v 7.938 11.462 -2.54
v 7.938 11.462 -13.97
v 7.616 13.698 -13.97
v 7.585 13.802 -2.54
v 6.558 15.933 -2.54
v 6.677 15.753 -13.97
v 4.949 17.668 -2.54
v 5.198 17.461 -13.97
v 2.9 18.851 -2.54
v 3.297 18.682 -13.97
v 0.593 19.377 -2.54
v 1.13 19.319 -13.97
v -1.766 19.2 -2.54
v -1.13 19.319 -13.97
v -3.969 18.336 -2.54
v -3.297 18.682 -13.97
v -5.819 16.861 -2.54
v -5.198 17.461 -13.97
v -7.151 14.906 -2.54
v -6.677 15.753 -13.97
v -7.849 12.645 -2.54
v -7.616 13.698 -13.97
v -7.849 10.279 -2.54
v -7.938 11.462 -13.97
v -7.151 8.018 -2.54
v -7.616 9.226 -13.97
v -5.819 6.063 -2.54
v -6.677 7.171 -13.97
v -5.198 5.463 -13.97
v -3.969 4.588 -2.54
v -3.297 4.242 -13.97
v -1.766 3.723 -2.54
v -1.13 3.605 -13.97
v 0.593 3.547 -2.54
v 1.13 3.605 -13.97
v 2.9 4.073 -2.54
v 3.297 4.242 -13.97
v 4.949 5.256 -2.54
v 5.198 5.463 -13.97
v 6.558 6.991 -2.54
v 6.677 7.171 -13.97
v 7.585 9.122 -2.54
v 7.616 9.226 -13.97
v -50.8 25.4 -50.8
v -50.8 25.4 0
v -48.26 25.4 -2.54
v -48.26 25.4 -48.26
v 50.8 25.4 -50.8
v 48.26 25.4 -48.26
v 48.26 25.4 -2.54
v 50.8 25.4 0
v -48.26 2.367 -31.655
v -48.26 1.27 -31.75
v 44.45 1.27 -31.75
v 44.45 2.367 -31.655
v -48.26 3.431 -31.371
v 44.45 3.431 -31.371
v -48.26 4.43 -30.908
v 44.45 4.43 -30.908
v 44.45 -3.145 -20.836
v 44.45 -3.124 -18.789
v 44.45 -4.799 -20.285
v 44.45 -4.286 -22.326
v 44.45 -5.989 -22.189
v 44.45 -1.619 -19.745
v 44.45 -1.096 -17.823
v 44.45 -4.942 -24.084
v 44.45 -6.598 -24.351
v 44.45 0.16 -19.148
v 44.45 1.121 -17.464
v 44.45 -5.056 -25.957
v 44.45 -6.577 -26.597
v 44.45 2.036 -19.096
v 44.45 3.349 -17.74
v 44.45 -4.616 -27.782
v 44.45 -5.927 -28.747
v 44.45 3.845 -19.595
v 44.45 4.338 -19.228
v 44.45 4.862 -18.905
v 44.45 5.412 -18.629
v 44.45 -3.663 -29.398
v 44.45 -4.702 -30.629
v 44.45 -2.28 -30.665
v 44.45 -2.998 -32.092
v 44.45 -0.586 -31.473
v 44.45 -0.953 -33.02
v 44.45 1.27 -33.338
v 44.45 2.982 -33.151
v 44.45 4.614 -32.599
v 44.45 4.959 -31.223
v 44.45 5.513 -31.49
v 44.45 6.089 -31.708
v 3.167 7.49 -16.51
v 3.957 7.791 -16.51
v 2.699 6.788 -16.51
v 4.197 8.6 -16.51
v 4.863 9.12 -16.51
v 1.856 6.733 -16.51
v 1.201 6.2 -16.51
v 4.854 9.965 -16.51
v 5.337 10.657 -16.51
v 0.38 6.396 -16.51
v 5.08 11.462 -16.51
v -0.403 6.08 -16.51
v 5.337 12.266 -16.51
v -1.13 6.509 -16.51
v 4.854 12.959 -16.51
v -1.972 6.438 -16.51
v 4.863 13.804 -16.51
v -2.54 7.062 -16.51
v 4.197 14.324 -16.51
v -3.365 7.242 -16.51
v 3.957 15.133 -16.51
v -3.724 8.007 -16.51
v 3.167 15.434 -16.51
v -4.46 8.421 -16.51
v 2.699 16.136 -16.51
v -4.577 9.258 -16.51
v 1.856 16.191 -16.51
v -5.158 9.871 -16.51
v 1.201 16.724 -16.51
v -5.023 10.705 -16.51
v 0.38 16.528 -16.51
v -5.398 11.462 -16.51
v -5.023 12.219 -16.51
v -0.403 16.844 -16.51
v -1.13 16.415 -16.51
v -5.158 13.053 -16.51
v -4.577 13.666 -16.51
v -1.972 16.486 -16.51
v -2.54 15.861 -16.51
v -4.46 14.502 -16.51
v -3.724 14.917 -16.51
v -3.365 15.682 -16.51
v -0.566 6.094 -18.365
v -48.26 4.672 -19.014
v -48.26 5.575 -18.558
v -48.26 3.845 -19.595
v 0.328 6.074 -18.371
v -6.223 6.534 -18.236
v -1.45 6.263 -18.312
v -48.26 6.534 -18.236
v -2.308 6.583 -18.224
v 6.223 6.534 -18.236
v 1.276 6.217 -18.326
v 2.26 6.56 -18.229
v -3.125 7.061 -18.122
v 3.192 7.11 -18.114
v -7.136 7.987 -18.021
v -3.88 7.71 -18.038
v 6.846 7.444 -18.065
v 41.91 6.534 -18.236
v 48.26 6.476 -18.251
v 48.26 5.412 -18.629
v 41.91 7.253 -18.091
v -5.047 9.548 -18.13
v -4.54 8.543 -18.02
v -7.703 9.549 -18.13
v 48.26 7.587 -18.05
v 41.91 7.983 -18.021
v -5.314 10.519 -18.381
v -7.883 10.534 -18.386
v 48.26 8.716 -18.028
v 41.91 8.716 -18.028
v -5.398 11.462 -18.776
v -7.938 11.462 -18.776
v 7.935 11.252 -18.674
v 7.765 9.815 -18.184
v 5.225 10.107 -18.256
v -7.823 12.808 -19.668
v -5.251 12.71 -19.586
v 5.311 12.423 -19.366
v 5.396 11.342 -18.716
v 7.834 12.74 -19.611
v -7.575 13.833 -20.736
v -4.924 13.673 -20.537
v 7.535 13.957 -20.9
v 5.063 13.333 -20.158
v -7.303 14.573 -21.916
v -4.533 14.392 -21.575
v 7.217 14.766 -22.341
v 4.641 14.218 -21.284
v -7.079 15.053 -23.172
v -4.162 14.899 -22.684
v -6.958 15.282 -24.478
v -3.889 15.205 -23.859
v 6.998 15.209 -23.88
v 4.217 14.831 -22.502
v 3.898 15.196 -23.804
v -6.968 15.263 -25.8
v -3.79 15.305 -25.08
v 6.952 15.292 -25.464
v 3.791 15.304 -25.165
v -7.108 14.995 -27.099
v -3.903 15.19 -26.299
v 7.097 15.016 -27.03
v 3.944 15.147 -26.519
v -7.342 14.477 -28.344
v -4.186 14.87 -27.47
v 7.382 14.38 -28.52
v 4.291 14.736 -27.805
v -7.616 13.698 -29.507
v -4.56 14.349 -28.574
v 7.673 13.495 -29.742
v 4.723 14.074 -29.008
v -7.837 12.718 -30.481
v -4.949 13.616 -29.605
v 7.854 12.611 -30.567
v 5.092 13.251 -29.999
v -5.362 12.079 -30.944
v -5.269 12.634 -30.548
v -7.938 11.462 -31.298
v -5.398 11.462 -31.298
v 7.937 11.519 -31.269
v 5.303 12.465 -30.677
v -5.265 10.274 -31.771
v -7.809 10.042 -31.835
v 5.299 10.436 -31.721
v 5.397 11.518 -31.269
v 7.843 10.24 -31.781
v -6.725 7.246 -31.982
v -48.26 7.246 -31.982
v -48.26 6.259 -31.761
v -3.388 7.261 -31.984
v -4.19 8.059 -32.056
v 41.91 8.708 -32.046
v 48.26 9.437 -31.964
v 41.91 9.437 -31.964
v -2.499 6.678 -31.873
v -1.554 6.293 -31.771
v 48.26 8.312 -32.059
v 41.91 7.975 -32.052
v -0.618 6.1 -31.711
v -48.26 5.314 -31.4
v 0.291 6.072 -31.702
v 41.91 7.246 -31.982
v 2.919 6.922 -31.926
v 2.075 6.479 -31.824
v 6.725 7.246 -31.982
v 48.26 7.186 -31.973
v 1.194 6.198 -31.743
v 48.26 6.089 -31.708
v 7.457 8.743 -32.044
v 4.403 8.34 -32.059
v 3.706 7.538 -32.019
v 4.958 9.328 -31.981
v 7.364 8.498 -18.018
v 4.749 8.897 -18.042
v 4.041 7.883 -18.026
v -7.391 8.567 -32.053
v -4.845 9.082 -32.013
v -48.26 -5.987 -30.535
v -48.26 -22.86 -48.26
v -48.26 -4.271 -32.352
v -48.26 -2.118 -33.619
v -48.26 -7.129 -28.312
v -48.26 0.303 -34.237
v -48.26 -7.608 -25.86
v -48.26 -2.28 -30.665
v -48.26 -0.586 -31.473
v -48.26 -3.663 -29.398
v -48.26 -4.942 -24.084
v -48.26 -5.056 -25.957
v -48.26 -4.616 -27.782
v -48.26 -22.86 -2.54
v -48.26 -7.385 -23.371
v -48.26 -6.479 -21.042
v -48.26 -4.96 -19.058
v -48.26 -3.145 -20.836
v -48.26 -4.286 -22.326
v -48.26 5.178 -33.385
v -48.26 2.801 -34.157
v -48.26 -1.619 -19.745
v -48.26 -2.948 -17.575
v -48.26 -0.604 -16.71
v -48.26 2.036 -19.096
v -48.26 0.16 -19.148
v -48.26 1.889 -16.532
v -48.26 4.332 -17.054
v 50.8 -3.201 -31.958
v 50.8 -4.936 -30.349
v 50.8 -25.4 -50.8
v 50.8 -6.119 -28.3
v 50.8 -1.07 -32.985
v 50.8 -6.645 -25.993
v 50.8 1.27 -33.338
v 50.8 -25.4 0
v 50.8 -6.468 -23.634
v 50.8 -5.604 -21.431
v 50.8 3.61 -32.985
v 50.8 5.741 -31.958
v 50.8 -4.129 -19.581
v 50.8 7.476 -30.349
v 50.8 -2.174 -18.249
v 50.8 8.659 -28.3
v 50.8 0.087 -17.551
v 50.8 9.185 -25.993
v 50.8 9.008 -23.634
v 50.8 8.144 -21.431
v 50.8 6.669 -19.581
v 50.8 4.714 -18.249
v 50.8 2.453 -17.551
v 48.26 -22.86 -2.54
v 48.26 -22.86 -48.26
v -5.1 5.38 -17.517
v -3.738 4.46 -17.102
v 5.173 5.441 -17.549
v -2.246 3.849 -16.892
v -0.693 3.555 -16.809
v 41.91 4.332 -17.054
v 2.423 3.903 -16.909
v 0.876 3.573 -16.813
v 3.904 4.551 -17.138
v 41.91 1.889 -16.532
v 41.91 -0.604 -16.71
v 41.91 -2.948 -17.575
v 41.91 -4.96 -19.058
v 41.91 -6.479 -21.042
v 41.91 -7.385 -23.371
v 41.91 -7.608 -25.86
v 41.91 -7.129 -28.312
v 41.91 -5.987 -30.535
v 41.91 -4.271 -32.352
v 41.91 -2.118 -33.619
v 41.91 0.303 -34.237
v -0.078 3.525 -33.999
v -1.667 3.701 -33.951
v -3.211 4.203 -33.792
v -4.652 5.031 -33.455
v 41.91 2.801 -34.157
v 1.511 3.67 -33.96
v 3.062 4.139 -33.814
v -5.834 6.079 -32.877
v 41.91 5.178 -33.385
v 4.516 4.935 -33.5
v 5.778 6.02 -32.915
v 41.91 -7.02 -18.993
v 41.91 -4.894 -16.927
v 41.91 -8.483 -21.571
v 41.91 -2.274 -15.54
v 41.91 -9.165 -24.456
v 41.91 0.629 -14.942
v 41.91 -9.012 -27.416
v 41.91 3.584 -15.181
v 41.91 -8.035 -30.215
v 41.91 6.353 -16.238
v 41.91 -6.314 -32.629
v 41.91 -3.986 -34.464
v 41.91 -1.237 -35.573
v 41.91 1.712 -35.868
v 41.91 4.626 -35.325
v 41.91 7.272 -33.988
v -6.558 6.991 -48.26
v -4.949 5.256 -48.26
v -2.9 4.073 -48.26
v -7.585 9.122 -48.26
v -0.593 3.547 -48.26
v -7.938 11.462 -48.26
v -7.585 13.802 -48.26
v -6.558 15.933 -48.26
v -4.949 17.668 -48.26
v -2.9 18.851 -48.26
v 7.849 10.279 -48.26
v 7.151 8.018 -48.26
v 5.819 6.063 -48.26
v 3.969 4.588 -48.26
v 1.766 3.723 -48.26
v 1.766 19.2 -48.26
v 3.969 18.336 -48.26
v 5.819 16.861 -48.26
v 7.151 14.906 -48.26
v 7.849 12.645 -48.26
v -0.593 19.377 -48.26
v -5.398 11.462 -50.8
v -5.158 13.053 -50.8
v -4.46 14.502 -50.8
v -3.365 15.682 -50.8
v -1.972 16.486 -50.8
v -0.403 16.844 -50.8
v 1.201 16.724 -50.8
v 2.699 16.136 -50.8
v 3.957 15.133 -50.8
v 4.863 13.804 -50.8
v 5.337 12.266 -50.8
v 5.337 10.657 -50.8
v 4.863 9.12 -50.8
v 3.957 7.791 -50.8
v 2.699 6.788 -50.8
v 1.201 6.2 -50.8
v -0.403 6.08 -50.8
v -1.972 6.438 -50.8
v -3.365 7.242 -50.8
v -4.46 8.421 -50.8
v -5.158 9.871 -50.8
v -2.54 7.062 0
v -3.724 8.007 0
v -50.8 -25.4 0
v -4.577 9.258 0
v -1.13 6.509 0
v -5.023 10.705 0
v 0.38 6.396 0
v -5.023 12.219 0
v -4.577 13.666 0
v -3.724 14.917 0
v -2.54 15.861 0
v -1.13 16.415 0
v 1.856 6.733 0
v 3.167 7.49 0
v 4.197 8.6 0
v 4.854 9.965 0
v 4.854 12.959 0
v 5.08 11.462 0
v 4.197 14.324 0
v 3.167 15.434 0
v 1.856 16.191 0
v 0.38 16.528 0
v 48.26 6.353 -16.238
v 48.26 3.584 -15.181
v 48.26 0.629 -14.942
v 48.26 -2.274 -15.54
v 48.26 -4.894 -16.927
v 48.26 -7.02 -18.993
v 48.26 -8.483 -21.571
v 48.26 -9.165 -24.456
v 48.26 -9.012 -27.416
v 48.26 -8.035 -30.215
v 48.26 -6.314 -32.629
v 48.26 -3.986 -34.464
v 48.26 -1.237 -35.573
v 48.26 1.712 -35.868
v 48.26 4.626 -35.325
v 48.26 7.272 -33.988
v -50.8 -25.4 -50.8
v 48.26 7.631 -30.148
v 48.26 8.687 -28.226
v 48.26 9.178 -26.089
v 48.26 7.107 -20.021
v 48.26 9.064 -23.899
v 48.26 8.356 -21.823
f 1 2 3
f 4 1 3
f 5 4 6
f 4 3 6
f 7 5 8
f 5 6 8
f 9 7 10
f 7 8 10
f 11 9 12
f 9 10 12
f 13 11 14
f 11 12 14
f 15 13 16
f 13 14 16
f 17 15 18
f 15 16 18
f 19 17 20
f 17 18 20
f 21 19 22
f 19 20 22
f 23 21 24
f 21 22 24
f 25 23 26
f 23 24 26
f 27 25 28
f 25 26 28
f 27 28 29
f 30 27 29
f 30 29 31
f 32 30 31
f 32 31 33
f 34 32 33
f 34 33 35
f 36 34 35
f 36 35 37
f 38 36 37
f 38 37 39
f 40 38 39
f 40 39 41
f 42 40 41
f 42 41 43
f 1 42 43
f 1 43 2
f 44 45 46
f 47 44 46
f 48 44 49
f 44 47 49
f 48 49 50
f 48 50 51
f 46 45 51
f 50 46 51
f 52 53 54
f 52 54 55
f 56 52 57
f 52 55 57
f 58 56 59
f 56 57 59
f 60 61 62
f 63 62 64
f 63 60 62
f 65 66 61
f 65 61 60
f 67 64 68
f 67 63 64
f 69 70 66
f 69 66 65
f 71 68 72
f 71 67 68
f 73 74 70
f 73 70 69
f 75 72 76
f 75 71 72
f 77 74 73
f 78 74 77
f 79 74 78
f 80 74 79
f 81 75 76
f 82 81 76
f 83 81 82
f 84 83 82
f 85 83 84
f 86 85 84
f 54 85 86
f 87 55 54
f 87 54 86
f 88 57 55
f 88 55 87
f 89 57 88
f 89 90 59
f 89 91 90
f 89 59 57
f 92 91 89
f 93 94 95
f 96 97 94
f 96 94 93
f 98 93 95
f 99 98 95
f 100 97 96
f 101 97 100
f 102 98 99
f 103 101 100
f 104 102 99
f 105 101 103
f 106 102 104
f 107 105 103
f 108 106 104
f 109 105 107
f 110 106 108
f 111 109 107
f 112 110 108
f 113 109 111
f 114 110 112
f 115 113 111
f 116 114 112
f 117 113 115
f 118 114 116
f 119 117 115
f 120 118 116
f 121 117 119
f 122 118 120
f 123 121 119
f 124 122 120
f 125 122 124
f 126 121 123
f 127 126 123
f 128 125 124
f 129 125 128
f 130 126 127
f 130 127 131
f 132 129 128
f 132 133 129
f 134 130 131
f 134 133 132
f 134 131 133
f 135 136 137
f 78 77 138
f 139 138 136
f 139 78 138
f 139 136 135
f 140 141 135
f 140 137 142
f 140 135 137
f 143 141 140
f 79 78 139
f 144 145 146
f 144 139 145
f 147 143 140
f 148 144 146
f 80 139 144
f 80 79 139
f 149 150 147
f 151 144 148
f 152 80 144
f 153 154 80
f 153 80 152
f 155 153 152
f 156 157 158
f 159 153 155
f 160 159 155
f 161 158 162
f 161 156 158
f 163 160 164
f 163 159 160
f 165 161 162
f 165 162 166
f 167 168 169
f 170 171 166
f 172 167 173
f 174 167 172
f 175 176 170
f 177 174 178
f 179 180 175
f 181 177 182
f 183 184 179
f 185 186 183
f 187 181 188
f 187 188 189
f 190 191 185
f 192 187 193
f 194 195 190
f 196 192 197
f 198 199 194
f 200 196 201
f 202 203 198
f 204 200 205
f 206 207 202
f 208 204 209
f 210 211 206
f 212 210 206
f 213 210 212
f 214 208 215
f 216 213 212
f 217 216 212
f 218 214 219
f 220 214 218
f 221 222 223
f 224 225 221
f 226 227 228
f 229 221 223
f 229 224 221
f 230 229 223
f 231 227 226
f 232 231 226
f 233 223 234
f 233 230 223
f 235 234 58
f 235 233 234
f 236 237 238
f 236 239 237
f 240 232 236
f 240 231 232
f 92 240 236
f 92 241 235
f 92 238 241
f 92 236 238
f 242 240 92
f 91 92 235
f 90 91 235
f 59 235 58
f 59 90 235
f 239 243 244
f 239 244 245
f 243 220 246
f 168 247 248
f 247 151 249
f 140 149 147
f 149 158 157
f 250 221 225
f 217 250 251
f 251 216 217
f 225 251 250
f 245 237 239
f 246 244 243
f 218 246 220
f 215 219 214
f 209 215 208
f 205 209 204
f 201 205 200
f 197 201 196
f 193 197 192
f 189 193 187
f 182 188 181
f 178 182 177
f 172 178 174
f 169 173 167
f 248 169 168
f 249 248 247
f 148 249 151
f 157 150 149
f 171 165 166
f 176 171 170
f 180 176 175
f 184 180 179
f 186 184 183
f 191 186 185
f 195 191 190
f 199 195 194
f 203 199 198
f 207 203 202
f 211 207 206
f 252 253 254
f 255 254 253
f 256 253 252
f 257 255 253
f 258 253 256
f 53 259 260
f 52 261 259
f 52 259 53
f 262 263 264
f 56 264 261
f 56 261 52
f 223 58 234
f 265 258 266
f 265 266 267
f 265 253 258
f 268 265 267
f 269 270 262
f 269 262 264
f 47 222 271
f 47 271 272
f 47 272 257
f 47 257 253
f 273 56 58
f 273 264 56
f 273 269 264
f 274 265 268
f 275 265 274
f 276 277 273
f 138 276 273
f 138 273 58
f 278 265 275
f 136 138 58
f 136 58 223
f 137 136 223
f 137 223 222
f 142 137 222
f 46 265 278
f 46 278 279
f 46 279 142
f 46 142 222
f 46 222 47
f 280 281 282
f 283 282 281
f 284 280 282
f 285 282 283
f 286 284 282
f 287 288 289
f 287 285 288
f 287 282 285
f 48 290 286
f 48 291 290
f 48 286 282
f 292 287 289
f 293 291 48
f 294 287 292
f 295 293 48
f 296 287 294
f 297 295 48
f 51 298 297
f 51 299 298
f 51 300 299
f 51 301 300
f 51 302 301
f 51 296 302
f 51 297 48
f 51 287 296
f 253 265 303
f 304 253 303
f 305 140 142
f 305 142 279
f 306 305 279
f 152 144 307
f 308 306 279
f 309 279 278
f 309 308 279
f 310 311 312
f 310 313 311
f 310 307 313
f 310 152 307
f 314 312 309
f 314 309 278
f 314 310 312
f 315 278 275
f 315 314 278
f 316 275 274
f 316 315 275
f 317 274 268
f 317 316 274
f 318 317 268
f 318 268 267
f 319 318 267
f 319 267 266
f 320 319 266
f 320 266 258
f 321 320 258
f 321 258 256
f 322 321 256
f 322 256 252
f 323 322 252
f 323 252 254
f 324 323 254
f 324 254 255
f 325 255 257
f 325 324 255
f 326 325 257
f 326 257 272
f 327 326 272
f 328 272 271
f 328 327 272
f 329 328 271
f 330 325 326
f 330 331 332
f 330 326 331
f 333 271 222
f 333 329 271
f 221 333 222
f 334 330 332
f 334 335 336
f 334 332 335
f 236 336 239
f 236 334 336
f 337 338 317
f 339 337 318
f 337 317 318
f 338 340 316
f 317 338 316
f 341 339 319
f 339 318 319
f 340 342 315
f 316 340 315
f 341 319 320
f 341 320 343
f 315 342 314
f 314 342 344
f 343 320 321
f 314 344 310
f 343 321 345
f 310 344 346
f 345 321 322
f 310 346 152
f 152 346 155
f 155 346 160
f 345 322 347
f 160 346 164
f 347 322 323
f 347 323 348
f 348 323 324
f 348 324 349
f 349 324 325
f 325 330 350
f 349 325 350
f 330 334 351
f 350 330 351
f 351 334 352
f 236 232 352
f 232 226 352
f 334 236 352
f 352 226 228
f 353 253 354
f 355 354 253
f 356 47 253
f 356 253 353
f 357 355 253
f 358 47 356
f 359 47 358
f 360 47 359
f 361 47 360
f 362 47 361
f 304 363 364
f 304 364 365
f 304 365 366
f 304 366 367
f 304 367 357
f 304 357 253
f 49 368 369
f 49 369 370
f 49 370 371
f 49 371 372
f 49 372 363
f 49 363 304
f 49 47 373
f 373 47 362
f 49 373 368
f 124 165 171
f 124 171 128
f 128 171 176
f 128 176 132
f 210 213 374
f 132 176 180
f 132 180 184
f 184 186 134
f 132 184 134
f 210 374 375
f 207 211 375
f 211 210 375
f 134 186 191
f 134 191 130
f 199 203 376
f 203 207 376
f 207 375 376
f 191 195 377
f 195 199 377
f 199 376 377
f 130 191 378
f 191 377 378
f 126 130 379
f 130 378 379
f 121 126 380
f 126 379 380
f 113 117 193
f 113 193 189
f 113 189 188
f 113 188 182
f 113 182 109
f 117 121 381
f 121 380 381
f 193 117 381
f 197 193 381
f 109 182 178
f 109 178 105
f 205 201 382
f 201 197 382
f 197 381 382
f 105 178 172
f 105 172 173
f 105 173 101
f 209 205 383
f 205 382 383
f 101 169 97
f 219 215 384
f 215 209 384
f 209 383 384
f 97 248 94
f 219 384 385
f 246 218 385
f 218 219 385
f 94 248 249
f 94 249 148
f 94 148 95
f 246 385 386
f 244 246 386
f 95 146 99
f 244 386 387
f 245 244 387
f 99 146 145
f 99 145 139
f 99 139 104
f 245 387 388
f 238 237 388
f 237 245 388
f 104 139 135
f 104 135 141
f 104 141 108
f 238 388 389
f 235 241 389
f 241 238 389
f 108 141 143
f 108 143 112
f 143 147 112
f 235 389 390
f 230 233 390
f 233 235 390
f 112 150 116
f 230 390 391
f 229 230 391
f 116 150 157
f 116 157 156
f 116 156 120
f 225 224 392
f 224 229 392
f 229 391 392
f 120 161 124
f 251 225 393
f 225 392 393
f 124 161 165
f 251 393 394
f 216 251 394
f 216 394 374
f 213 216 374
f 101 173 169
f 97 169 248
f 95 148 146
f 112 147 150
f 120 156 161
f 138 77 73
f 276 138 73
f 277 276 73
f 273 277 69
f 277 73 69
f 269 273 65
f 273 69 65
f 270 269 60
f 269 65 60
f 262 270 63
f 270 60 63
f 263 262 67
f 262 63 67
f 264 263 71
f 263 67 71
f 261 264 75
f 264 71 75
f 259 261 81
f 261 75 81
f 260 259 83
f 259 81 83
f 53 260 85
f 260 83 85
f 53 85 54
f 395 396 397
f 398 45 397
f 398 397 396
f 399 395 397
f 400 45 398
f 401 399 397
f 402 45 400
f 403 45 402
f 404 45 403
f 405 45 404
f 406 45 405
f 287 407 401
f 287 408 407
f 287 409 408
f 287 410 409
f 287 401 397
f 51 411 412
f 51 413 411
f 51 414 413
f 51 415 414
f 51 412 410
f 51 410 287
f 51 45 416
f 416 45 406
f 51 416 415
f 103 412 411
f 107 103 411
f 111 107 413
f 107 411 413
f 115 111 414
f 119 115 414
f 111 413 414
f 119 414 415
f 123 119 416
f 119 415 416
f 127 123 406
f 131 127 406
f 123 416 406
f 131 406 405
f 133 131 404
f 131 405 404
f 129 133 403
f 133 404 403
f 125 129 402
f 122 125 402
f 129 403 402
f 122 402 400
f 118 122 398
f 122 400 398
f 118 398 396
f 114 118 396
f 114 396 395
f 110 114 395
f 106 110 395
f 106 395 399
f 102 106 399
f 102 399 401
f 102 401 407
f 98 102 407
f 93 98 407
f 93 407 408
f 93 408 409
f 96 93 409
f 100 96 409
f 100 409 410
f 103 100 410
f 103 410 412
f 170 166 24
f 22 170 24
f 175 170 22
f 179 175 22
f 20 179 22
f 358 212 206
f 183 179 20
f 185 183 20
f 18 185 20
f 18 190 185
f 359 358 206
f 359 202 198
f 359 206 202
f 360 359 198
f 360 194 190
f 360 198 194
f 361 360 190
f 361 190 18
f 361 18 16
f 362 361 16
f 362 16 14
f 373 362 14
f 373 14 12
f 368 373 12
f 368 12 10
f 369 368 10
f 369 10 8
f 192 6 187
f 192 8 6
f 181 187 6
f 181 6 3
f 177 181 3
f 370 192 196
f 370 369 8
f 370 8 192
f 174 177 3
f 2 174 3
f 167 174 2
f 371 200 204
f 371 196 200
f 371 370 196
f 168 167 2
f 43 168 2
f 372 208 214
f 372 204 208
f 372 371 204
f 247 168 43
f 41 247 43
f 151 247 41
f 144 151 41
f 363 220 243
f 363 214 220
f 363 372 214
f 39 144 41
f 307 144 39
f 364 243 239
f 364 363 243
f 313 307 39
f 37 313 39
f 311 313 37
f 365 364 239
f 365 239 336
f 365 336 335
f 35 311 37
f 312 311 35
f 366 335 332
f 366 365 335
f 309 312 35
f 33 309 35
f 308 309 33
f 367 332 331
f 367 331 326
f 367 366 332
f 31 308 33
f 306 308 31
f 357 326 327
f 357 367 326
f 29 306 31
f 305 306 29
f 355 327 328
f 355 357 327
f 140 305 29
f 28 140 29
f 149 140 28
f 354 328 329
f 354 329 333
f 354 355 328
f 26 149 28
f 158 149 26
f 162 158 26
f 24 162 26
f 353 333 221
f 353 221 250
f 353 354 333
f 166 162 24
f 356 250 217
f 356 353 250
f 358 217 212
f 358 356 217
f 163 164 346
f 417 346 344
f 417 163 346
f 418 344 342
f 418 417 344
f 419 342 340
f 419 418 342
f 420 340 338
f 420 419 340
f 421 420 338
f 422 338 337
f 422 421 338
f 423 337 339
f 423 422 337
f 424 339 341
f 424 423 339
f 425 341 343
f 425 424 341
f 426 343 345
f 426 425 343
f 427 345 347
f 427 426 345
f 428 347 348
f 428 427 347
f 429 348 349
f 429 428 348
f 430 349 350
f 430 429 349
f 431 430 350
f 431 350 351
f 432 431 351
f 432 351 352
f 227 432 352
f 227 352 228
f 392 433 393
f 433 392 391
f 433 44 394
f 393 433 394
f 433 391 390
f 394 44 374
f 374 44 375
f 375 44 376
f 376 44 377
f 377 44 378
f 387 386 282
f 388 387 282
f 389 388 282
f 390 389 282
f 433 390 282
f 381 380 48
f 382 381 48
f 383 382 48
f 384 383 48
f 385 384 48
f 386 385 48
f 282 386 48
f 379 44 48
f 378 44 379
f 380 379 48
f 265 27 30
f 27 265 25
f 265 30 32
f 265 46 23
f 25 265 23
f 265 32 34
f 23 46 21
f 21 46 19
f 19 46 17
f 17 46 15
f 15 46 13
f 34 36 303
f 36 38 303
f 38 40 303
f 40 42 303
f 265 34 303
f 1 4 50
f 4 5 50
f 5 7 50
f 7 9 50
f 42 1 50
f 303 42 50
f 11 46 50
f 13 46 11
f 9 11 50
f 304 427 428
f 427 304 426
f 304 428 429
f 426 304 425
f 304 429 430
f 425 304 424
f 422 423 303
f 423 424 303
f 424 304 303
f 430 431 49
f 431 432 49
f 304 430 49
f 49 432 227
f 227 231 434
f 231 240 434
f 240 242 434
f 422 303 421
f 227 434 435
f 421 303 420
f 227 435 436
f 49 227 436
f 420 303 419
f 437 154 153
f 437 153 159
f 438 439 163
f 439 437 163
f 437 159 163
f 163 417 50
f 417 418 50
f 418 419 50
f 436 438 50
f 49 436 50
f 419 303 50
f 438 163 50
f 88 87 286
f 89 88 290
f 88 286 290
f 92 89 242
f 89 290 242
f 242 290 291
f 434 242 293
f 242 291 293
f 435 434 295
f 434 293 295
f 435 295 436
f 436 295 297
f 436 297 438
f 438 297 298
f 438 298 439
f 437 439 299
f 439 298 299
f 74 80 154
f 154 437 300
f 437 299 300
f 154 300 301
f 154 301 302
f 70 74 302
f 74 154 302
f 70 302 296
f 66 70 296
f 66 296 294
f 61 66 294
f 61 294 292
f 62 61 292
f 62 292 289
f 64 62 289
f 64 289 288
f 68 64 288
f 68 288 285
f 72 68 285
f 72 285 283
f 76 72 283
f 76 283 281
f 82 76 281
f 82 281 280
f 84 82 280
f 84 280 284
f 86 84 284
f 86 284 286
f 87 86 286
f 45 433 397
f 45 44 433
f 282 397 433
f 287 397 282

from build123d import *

# Parameters (mm, degrees)
SKETCH1_W           = 101.6
SKETCH1_H           = 50.8
BOSS_EXTRUDE1_DEPTH = 50.8
SKETCH2_R           = 7.9375
CUT_EXTRUDE1_DEPTH  = 6.35
SKETCH3_R           = 6.35
CUT_EXTRUDE2_DEPTH  = 102.6
SKETCH4_R           = 5.3975
CUT_EXTRUDE3_DEPTH  = 34.29
SHELL9_T            = -2.54
SKETCH5_R           = 7.022033088
CUT_EXTRUDE4_DEPTH  = 96.52
SKETCH7_R           = 7.9375
BOSS_EXTRUDE3_DEPTH = 11.43
SKETCH9_R           = 5.08
CUT_EXTRUDE5_DEPTH  = 34.29
SKETCH10_R          = 6.35
BOSS_EXTRUDE4_DEPTH = 2.54


with BuildPart() as part:
    # Sketch1 → Boss-Extrude1 (new body)
    with BuildSketch(Plane.XY):
        Rectangle(SKETCH1_W, SKETCH1_H)
    extrude(amount=-BOSS_EXTRUDE1_DEPTH)

    # Sketch2 → Cut-Extrude1 (cut)
    with BuildSketch(Plane(origin=(50.8, 0, 0), x_dir=(0, 0, -1), z_dir=(1, 0, 0))):
        with Locations((25.4, 1.27)):
            Circle(SKETCH2_R)
    extrude(amount=-CUT_EXTRUDE1_DEPTH, mode=Mode.SUBTRACT)

    # Sketch3 → Cut-Extrude2 (cut, through all)
    with BuildSketch(Plane(origin=(50.8, 0, 0), x_dir=(0, 0, -1), z_dir=(1, 0, 0))):
        with Locations((25.4, 1.27)):
            Circle(SKETCH3_R)
    extrude(amount=-CUT_EXTRUDE2_DEPTH, mode=Mode.SUBTRACT)

    # Sketch4 → Cut-Extrude3 (cut)
    with BuildSketch(Plane(origin=(0, 0, -50.8), x_dir=(-1, 0, 0), z_dir=(0, 0, -1))):
        with Locations((0, 11.461907579)):
            Circle(SKETCH4_R)
    extrude(amount=-CUT_EXTRUDE3_DEPTH, mode=Mode.SUBTRACT)

    # Shell9
    shell9_openings = [part.faces().sort_by_distance(p)[0] for p in [
        (0, 25.4, -25.4),
    ]]
    offset(amount=SHELL9_T, openings=shell9_openings, kind=Kind.INTERSECTION)

    # Sketch5 → Cut-Extrude4 (cut)
    with BuildSketch(Plane.ZY.offset(-48.26)):
        with Locations((-25.037035013, 8.282646085)):
            Circle(SKETCH5_R)
    extrude(amount=CUT_EXTRUDE4_DEPTH, mode=Mode.SUBTRACT)

    # Sketch7 → Boss-Extrude3 (add)
    with BuildSketch(Plane.XY.offset(-13.97)):
        with Locations((0, 11.461907579)):
            Circle(SKETCH7_R)
    extrude(amount=BOSS_EXTRUDE3_DEPTH)

    # Sketch9 → Cut-Extrude5 (cut)
    with BuildSketch(Plane.XY):
        with Locations((0, 11.461907579)):
            Circle(SKETCH9_R)
    extrude(amount=-CUT_EXTRUDE5_DEPTH, mode=Mode.SUBTRACT)

    # Sketch10 → Boss-Extrude4 (add)
    with BuildSketch(Plane.ZY.offset(50.8)):
        with Locations((-25.4, 1.27)):
            Circle(SKETCH10_R)
    extrude(amount=-BOSS_EXTRUDE4_DEPTH)


solid = part.part
